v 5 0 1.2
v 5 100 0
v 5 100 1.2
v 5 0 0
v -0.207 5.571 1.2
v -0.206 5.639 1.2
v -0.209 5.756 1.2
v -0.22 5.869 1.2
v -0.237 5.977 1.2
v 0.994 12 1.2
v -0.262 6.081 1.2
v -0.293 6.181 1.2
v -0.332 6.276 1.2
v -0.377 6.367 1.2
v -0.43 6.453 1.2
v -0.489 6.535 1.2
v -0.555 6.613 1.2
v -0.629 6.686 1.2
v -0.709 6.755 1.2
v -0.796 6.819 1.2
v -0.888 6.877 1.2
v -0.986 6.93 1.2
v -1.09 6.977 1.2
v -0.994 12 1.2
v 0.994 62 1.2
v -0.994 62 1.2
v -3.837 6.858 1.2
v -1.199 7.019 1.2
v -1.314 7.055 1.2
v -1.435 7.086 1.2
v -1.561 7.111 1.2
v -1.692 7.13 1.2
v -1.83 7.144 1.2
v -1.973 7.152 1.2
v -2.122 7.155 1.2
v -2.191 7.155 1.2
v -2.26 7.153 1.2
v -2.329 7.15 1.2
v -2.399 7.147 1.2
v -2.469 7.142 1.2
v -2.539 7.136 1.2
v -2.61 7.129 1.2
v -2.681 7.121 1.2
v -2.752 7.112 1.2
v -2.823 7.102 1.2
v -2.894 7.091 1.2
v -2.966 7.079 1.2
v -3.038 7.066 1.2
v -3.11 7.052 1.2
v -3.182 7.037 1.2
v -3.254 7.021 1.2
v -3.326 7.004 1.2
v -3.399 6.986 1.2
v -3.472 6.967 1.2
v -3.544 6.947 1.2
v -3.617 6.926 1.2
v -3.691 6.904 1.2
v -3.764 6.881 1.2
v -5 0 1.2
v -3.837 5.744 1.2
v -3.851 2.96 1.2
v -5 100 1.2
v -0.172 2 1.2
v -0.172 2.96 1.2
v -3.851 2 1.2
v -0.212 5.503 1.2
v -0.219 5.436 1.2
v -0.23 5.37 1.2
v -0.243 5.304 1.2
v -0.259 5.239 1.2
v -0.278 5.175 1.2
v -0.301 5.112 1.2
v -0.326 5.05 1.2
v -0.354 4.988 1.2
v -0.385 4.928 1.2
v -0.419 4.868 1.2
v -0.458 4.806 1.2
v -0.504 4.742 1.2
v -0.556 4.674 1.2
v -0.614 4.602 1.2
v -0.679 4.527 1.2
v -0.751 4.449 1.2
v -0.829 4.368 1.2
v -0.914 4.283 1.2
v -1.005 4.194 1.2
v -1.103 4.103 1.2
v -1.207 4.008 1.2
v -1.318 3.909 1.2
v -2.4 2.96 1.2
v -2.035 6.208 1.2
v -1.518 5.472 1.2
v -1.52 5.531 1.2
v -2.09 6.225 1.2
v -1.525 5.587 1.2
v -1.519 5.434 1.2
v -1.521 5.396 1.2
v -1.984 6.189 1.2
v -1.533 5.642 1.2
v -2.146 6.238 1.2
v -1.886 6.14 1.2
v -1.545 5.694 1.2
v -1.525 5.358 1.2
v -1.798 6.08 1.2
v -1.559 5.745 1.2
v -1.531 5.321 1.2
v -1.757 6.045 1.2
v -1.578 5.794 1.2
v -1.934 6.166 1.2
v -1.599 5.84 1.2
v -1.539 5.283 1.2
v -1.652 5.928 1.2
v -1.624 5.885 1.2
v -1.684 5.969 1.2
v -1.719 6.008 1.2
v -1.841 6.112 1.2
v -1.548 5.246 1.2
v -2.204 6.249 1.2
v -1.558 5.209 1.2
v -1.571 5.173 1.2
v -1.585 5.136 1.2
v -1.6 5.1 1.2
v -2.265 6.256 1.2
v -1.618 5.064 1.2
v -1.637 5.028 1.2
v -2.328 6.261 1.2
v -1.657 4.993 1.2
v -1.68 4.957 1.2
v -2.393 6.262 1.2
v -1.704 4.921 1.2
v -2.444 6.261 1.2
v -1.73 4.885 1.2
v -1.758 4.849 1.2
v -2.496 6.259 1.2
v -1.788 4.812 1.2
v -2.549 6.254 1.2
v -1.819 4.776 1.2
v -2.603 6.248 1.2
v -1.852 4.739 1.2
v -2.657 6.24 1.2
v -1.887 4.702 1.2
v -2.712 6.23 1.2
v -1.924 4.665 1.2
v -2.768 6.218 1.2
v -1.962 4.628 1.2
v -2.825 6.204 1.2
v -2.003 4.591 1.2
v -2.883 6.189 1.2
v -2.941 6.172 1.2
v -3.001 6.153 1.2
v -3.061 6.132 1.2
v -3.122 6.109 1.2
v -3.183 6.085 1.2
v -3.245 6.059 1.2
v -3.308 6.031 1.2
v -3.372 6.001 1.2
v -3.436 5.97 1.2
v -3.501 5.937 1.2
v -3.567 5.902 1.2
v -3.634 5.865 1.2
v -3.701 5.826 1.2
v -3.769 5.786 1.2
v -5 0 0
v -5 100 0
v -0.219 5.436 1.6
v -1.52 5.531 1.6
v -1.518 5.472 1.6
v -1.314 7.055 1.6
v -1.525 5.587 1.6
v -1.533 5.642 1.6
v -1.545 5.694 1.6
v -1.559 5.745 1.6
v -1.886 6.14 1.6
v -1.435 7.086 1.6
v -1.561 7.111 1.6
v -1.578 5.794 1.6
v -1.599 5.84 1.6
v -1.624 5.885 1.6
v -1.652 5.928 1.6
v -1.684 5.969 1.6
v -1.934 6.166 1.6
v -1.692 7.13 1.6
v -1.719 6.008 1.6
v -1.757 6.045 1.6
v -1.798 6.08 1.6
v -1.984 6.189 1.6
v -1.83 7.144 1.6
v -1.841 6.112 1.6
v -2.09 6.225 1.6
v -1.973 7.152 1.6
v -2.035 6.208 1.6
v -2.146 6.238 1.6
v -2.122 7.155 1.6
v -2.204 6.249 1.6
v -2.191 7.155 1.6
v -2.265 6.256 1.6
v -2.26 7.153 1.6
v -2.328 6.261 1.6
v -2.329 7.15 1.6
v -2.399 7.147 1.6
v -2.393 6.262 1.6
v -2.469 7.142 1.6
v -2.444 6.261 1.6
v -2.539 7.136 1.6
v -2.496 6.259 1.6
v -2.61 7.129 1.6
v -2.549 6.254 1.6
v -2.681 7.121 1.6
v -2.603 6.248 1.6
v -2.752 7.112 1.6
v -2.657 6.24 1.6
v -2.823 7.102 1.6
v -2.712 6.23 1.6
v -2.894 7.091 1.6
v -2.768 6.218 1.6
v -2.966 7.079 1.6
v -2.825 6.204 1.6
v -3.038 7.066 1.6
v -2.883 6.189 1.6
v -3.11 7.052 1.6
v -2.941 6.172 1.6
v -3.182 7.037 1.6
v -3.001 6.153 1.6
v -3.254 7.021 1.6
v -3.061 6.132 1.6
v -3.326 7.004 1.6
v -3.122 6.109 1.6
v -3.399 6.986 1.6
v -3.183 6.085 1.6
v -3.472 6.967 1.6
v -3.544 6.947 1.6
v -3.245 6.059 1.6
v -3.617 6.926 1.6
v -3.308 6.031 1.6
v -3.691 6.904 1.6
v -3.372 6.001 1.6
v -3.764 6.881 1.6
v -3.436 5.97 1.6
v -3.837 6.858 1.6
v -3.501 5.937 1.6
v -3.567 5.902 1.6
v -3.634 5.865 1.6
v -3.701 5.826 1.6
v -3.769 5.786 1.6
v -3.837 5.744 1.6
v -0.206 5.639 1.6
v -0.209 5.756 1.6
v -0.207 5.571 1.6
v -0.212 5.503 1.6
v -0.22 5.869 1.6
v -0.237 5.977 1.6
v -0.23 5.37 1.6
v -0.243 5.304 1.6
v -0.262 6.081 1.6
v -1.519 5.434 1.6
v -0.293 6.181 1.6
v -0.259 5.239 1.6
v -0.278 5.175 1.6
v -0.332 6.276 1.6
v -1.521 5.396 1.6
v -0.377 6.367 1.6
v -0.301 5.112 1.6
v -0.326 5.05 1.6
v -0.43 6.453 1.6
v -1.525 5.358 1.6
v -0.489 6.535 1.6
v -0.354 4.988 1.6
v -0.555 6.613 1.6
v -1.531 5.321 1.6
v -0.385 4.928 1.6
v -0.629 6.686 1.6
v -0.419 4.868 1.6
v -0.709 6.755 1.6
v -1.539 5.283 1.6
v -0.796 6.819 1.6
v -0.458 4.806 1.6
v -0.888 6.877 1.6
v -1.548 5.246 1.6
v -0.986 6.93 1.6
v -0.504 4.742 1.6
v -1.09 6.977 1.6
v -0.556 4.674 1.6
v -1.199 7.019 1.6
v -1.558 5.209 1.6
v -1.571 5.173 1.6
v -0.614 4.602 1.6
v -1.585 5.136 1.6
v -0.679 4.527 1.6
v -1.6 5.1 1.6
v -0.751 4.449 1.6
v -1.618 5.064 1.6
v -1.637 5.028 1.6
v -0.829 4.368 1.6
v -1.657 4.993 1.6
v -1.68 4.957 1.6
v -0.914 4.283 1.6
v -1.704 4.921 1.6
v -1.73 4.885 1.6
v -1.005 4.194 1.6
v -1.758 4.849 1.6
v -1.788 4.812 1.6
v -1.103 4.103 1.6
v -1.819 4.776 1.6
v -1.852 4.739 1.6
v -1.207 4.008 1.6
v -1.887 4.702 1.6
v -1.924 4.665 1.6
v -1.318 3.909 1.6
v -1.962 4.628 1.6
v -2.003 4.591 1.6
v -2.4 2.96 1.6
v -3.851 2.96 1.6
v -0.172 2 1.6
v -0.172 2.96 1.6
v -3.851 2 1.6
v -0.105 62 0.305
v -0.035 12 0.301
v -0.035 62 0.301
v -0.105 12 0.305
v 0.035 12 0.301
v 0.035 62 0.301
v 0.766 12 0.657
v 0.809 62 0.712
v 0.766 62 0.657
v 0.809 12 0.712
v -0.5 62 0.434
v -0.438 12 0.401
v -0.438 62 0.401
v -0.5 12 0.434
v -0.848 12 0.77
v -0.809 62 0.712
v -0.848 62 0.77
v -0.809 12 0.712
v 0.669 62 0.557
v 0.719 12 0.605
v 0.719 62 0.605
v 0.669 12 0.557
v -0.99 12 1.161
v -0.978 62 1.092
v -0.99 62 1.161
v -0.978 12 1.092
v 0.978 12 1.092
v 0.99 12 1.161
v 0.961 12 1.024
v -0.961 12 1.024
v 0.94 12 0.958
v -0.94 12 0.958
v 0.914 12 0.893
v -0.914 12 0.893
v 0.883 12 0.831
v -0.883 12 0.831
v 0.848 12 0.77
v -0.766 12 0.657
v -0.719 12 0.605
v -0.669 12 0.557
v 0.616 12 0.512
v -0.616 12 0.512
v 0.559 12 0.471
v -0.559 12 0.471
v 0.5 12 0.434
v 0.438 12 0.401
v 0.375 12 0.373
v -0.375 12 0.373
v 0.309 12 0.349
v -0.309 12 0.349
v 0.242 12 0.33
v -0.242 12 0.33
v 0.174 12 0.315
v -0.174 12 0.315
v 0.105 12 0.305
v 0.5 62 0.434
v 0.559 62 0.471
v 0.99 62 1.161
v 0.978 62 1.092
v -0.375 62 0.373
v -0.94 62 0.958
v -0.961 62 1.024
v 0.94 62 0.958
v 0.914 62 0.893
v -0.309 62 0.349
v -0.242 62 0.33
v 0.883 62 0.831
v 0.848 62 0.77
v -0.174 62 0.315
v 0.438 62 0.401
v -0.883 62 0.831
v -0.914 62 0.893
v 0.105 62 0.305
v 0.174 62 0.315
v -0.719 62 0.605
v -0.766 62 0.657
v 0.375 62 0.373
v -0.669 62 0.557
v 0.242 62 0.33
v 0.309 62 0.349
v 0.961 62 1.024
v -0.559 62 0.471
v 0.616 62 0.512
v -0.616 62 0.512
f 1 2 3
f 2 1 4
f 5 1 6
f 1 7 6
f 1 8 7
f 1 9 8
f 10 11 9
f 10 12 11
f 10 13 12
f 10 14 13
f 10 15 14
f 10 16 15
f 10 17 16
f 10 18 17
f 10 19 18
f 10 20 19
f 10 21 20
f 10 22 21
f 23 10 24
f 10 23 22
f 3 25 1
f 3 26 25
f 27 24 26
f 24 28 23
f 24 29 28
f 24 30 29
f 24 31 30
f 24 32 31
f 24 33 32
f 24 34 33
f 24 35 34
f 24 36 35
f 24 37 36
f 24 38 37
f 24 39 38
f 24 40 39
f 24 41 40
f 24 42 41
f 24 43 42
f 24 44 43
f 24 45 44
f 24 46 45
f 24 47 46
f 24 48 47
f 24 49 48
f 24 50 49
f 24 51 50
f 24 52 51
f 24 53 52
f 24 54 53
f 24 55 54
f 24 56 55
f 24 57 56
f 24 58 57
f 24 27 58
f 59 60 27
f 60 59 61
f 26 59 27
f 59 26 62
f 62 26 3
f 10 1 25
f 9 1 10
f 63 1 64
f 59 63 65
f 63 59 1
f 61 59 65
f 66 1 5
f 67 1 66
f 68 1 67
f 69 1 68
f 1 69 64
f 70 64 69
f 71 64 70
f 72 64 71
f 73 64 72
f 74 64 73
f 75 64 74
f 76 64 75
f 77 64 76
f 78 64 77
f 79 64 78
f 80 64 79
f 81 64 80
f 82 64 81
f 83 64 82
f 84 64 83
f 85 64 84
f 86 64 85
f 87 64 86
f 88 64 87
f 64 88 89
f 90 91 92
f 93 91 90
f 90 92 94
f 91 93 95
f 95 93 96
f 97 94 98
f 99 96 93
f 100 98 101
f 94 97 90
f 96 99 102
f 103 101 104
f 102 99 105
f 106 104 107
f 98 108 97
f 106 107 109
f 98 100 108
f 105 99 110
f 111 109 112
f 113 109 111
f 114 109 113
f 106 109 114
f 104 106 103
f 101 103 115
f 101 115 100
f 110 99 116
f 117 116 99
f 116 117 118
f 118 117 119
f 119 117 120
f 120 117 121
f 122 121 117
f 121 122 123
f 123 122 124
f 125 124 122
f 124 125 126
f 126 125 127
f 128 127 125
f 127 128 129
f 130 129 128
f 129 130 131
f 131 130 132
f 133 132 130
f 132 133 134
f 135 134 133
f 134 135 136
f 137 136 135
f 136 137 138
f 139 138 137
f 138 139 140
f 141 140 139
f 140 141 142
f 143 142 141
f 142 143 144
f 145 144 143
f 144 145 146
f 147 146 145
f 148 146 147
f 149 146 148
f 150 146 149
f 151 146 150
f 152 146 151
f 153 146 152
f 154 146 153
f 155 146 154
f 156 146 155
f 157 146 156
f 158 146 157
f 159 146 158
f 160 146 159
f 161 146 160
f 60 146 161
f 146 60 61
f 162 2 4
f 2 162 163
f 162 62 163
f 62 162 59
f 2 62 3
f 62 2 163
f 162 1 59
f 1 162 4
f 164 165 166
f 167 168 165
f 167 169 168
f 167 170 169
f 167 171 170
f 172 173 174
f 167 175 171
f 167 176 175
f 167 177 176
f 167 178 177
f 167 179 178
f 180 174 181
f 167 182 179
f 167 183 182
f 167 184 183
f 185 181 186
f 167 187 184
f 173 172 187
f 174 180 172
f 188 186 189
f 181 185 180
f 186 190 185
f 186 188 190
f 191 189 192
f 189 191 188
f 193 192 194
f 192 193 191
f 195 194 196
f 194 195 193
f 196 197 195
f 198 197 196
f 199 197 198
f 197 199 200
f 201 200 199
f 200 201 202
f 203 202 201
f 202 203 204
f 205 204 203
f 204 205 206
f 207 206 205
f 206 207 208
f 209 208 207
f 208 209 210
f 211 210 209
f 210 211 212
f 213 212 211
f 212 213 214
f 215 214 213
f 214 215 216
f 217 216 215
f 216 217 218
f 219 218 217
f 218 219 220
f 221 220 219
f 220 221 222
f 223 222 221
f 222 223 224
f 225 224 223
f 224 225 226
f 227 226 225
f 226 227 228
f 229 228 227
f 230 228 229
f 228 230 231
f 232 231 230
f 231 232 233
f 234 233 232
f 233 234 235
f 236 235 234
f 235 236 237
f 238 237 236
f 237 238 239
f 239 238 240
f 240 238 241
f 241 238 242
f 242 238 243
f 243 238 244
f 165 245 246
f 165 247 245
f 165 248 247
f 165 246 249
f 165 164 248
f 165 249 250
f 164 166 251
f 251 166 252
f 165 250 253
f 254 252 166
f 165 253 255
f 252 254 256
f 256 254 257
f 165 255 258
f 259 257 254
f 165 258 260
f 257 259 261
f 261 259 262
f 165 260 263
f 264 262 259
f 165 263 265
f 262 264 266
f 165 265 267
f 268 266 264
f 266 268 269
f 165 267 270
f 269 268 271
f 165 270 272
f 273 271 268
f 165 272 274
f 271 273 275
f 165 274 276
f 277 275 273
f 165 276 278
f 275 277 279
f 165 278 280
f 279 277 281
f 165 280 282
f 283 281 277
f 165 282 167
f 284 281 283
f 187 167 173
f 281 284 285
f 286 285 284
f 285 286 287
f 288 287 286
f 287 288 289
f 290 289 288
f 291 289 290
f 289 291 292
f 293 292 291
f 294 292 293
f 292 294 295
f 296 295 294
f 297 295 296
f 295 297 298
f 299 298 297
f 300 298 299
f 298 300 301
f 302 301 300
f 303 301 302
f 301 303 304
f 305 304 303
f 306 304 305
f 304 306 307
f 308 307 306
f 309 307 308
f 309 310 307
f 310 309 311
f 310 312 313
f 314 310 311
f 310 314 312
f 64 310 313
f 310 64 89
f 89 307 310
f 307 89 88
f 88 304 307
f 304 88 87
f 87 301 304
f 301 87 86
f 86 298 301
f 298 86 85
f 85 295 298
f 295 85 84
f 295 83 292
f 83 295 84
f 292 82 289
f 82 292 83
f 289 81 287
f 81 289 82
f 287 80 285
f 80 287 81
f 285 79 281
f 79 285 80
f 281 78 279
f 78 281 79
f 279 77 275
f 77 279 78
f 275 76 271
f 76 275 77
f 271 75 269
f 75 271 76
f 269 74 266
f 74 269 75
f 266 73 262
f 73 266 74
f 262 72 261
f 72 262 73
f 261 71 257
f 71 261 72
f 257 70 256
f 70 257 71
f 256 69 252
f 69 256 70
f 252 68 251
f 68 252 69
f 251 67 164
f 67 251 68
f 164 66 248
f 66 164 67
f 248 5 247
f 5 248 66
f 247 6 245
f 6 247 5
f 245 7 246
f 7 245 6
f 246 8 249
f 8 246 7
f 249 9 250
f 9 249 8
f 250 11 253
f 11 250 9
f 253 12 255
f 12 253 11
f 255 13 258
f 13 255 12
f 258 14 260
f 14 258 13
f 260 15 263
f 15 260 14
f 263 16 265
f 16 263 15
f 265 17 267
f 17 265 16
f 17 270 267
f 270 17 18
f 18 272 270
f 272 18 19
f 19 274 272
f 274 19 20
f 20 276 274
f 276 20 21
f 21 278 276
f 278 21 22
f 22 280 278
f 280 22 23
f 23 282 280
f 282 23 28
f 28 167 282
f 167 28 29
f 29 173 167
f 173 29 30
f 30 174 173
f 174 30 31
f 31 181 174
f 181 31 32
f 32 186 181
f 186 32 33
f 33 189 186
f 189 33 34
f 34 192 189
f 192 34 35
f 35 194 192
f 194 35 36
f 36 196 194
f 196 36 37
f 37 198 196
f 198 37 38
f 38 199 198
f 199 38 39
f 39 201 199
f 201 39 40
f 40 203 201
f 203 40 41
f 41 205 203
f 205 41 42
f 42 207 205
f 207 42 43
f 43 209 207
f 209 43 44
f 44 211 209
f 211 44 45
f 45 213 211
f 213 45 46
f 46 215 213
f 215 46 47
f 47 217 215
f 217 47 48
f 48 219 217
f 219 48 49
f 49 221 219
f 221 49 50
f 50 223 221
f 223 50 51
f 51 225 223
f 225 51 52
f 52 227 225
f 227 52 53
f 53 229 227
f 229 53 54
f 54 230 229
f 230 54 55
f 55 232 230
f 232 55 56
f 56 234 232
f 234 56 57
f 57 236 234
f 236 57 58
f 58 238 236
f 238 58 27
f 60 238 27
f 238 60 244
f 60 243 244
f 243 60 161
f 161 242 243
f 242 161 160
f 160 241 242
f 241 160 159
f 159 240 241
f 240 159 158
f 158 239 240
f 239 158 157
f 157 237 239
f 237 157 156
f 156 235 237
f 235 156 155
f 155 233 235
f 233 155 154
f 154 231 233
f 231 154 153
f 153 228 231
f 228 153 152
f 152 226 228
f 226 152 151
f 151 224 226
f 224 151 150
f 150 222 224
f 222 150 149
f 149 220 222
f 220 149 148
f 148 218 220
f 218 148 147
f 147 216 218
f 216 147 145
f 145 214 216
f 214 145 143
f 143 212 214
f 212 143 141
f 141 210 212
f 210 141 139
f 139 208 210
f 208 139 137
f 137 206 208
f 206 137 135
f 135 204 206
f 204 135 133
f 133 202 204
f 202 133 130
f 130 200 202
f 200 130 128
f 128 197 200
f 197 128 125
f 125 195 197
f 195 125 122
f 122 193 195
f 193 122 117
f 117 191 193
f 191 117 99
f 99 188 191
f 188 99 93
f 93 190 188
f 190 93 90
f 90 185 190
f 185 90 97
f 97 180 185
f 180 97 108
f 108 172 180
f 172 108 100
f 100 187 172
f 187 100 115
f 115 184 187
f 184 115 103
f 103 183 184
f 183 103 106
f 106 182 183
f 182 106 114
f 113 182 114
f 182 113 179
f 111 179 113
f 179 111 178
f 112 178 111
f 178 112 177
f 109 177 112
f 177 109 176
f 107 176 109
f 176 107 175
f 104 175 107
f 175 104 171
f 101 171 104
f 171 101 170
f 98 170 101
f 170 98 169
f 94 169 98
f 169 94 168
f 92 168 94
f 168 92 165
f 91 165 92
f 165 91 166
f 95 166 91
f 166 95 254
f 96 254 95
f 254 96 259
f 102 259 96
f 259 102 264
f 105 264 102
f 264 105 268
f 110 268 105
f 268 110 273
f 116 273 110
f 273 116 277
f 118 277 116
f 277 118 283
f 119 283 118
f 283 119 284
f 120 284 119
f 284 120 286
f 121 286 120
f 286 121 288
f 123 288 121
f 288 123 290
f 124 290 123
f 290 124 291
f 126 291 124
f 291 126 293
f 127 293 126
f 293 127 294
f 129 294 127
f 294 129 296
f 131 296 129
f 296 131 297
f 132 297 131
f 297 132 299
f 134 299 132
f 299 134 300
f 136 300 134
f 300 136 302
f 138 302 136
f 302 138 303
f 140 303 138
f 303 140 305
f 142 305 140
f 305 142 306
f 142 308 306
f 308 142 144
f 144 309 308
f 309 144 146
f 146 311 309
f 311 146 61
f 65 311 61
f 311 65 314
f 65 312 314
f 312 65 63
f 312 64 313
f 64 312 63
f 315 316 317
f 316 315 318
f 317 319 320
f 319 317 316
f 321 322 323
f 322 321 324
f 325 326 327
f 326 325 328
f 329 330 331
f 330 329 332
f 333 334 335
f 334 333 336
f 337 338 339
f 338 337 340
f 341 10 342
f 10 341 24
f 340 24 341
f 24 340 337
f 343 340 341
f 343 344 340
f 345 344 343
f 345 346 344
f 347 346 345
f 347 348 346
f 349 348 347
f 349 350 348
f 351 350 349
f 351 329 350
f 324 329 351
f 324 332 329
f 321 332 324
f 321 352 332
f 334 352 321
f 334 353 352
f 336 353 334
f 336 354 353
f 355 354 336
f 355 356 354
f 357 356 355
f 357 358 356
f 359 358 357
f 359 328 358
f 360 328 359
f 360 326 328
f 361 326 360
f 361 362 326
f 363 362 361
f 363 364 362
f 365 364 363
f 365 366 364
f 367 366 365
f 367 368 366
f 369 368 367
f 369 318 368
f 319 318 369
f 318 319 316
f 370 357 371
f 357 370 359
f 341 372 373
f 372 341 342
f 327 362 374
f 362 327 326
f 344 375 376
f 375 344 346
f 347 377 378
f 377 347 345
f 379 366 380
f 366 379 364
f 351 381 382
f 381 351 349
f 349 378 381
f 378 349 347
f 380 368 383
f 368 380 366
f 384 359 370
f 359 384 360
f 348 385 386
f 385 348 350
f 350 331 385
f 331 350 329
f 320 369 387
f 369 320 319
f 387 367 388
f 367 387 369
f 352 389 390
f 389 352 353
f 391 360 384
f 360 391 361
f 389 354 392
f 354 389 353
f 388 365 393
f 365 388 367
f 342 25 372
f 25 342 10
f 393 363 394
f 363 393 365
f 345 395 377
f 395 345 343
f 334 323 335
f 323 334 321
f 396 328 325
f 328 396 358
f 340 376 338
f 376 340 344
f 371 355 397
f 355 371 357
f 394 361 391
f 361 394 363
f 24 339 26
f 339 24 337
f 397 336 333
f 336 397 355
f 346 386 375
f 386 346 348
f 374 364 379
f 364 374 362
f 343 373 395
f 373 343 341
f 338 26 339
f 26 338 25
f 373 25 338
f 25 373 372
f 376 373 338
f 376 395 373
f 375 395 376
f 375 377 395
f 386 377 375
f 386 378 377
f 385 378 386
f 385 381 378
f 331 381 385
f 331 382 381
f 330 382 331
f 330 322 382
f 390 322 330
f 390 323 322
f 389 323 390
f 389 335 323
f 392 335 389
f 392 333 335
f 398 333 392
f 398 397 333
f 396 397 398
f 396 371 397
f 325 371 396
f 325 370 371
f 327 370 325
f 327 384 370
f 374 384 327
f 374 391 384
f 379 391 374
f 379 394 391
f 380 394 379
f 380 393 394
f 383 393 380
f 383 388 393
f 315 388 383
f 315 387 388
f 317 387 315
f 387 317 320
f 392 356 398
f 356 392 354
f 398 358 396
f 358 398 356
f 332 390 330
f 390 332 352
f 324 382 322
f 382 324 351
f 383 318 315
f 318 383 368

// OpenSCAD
// file: module/drill-bit-storage.scad
/*
    Drill bit storage
*/

$fn=90;  // accuracy


// Constants (Don't change)
storageLenght = 100; // Not Bit lenght
maxBitLenght  = 70;  // Check bit lenght
storageWidth  = 10;  // Minimum width

// Bit dependent
bitDiameter = 4.0;



module drillBitStorage (bitDiameter,maxBitLenght,
	storageWidth,storageLenght){

// Automatic Variables  (Don't change)
diameterText      = str(bitDiameter);
storageHight      = bitDiameter*0.6; 
bitRadius         = bitDiameter/2;
bitPositionHeight = storageHight+bitDiameter*0.05; 


// Delition for crating drill track
difference() {

// Union for text and storage
union(){

// Storage 
translate([
    -storageWidth/2,    // Centering
    0, 
    0
    ]) 
cube(size = [
    storageWidth,
    storageLenght,
    storageHight
    ]);

// Milimiter dimension text
translate([
    -4.4,               // Fine deling x-axis
    2,                  // Fine deling y-axis 
    storageHight         
    ])
linear_extrude(height=0.4)text(
    diameterText,  // Dynamic text
    size=5,
    font="tohoma:style=bold",
    spacing=0.9
    );
    
// End of union    
}  

// Begining of Delition
// Drill tracl
rotate([90,0,0])
translate([
    0,                   // x-axis
    bitPositionHeight,   // Z-axis
    -(maxBitLenght+12)    // y-axis
    ])  
cylinder(
    h = maxBitLenght,    // y-axis
    r = bitRadius        // x-axis 
    );      

// End of Delition
}}
// main file
/*
    Drill bit storage
*/

$fn=90;  // accuracy

// import module
use <module/drill-bit-storage.scad>;



// Tootale lenght of the unit
storageLenght = 100; 

// Width of the unit
storageWidth  = 10;  // (Constant under 4mm)  

// The lenght of the drill bit
maxBitLenght  = 50;  

// Drill bit diameter  
bitDiameter = 2.0;


// Call the module
drillBitStorage 
    (bitDiameter,maxBitLenght,storageWidth,storageLenght);
